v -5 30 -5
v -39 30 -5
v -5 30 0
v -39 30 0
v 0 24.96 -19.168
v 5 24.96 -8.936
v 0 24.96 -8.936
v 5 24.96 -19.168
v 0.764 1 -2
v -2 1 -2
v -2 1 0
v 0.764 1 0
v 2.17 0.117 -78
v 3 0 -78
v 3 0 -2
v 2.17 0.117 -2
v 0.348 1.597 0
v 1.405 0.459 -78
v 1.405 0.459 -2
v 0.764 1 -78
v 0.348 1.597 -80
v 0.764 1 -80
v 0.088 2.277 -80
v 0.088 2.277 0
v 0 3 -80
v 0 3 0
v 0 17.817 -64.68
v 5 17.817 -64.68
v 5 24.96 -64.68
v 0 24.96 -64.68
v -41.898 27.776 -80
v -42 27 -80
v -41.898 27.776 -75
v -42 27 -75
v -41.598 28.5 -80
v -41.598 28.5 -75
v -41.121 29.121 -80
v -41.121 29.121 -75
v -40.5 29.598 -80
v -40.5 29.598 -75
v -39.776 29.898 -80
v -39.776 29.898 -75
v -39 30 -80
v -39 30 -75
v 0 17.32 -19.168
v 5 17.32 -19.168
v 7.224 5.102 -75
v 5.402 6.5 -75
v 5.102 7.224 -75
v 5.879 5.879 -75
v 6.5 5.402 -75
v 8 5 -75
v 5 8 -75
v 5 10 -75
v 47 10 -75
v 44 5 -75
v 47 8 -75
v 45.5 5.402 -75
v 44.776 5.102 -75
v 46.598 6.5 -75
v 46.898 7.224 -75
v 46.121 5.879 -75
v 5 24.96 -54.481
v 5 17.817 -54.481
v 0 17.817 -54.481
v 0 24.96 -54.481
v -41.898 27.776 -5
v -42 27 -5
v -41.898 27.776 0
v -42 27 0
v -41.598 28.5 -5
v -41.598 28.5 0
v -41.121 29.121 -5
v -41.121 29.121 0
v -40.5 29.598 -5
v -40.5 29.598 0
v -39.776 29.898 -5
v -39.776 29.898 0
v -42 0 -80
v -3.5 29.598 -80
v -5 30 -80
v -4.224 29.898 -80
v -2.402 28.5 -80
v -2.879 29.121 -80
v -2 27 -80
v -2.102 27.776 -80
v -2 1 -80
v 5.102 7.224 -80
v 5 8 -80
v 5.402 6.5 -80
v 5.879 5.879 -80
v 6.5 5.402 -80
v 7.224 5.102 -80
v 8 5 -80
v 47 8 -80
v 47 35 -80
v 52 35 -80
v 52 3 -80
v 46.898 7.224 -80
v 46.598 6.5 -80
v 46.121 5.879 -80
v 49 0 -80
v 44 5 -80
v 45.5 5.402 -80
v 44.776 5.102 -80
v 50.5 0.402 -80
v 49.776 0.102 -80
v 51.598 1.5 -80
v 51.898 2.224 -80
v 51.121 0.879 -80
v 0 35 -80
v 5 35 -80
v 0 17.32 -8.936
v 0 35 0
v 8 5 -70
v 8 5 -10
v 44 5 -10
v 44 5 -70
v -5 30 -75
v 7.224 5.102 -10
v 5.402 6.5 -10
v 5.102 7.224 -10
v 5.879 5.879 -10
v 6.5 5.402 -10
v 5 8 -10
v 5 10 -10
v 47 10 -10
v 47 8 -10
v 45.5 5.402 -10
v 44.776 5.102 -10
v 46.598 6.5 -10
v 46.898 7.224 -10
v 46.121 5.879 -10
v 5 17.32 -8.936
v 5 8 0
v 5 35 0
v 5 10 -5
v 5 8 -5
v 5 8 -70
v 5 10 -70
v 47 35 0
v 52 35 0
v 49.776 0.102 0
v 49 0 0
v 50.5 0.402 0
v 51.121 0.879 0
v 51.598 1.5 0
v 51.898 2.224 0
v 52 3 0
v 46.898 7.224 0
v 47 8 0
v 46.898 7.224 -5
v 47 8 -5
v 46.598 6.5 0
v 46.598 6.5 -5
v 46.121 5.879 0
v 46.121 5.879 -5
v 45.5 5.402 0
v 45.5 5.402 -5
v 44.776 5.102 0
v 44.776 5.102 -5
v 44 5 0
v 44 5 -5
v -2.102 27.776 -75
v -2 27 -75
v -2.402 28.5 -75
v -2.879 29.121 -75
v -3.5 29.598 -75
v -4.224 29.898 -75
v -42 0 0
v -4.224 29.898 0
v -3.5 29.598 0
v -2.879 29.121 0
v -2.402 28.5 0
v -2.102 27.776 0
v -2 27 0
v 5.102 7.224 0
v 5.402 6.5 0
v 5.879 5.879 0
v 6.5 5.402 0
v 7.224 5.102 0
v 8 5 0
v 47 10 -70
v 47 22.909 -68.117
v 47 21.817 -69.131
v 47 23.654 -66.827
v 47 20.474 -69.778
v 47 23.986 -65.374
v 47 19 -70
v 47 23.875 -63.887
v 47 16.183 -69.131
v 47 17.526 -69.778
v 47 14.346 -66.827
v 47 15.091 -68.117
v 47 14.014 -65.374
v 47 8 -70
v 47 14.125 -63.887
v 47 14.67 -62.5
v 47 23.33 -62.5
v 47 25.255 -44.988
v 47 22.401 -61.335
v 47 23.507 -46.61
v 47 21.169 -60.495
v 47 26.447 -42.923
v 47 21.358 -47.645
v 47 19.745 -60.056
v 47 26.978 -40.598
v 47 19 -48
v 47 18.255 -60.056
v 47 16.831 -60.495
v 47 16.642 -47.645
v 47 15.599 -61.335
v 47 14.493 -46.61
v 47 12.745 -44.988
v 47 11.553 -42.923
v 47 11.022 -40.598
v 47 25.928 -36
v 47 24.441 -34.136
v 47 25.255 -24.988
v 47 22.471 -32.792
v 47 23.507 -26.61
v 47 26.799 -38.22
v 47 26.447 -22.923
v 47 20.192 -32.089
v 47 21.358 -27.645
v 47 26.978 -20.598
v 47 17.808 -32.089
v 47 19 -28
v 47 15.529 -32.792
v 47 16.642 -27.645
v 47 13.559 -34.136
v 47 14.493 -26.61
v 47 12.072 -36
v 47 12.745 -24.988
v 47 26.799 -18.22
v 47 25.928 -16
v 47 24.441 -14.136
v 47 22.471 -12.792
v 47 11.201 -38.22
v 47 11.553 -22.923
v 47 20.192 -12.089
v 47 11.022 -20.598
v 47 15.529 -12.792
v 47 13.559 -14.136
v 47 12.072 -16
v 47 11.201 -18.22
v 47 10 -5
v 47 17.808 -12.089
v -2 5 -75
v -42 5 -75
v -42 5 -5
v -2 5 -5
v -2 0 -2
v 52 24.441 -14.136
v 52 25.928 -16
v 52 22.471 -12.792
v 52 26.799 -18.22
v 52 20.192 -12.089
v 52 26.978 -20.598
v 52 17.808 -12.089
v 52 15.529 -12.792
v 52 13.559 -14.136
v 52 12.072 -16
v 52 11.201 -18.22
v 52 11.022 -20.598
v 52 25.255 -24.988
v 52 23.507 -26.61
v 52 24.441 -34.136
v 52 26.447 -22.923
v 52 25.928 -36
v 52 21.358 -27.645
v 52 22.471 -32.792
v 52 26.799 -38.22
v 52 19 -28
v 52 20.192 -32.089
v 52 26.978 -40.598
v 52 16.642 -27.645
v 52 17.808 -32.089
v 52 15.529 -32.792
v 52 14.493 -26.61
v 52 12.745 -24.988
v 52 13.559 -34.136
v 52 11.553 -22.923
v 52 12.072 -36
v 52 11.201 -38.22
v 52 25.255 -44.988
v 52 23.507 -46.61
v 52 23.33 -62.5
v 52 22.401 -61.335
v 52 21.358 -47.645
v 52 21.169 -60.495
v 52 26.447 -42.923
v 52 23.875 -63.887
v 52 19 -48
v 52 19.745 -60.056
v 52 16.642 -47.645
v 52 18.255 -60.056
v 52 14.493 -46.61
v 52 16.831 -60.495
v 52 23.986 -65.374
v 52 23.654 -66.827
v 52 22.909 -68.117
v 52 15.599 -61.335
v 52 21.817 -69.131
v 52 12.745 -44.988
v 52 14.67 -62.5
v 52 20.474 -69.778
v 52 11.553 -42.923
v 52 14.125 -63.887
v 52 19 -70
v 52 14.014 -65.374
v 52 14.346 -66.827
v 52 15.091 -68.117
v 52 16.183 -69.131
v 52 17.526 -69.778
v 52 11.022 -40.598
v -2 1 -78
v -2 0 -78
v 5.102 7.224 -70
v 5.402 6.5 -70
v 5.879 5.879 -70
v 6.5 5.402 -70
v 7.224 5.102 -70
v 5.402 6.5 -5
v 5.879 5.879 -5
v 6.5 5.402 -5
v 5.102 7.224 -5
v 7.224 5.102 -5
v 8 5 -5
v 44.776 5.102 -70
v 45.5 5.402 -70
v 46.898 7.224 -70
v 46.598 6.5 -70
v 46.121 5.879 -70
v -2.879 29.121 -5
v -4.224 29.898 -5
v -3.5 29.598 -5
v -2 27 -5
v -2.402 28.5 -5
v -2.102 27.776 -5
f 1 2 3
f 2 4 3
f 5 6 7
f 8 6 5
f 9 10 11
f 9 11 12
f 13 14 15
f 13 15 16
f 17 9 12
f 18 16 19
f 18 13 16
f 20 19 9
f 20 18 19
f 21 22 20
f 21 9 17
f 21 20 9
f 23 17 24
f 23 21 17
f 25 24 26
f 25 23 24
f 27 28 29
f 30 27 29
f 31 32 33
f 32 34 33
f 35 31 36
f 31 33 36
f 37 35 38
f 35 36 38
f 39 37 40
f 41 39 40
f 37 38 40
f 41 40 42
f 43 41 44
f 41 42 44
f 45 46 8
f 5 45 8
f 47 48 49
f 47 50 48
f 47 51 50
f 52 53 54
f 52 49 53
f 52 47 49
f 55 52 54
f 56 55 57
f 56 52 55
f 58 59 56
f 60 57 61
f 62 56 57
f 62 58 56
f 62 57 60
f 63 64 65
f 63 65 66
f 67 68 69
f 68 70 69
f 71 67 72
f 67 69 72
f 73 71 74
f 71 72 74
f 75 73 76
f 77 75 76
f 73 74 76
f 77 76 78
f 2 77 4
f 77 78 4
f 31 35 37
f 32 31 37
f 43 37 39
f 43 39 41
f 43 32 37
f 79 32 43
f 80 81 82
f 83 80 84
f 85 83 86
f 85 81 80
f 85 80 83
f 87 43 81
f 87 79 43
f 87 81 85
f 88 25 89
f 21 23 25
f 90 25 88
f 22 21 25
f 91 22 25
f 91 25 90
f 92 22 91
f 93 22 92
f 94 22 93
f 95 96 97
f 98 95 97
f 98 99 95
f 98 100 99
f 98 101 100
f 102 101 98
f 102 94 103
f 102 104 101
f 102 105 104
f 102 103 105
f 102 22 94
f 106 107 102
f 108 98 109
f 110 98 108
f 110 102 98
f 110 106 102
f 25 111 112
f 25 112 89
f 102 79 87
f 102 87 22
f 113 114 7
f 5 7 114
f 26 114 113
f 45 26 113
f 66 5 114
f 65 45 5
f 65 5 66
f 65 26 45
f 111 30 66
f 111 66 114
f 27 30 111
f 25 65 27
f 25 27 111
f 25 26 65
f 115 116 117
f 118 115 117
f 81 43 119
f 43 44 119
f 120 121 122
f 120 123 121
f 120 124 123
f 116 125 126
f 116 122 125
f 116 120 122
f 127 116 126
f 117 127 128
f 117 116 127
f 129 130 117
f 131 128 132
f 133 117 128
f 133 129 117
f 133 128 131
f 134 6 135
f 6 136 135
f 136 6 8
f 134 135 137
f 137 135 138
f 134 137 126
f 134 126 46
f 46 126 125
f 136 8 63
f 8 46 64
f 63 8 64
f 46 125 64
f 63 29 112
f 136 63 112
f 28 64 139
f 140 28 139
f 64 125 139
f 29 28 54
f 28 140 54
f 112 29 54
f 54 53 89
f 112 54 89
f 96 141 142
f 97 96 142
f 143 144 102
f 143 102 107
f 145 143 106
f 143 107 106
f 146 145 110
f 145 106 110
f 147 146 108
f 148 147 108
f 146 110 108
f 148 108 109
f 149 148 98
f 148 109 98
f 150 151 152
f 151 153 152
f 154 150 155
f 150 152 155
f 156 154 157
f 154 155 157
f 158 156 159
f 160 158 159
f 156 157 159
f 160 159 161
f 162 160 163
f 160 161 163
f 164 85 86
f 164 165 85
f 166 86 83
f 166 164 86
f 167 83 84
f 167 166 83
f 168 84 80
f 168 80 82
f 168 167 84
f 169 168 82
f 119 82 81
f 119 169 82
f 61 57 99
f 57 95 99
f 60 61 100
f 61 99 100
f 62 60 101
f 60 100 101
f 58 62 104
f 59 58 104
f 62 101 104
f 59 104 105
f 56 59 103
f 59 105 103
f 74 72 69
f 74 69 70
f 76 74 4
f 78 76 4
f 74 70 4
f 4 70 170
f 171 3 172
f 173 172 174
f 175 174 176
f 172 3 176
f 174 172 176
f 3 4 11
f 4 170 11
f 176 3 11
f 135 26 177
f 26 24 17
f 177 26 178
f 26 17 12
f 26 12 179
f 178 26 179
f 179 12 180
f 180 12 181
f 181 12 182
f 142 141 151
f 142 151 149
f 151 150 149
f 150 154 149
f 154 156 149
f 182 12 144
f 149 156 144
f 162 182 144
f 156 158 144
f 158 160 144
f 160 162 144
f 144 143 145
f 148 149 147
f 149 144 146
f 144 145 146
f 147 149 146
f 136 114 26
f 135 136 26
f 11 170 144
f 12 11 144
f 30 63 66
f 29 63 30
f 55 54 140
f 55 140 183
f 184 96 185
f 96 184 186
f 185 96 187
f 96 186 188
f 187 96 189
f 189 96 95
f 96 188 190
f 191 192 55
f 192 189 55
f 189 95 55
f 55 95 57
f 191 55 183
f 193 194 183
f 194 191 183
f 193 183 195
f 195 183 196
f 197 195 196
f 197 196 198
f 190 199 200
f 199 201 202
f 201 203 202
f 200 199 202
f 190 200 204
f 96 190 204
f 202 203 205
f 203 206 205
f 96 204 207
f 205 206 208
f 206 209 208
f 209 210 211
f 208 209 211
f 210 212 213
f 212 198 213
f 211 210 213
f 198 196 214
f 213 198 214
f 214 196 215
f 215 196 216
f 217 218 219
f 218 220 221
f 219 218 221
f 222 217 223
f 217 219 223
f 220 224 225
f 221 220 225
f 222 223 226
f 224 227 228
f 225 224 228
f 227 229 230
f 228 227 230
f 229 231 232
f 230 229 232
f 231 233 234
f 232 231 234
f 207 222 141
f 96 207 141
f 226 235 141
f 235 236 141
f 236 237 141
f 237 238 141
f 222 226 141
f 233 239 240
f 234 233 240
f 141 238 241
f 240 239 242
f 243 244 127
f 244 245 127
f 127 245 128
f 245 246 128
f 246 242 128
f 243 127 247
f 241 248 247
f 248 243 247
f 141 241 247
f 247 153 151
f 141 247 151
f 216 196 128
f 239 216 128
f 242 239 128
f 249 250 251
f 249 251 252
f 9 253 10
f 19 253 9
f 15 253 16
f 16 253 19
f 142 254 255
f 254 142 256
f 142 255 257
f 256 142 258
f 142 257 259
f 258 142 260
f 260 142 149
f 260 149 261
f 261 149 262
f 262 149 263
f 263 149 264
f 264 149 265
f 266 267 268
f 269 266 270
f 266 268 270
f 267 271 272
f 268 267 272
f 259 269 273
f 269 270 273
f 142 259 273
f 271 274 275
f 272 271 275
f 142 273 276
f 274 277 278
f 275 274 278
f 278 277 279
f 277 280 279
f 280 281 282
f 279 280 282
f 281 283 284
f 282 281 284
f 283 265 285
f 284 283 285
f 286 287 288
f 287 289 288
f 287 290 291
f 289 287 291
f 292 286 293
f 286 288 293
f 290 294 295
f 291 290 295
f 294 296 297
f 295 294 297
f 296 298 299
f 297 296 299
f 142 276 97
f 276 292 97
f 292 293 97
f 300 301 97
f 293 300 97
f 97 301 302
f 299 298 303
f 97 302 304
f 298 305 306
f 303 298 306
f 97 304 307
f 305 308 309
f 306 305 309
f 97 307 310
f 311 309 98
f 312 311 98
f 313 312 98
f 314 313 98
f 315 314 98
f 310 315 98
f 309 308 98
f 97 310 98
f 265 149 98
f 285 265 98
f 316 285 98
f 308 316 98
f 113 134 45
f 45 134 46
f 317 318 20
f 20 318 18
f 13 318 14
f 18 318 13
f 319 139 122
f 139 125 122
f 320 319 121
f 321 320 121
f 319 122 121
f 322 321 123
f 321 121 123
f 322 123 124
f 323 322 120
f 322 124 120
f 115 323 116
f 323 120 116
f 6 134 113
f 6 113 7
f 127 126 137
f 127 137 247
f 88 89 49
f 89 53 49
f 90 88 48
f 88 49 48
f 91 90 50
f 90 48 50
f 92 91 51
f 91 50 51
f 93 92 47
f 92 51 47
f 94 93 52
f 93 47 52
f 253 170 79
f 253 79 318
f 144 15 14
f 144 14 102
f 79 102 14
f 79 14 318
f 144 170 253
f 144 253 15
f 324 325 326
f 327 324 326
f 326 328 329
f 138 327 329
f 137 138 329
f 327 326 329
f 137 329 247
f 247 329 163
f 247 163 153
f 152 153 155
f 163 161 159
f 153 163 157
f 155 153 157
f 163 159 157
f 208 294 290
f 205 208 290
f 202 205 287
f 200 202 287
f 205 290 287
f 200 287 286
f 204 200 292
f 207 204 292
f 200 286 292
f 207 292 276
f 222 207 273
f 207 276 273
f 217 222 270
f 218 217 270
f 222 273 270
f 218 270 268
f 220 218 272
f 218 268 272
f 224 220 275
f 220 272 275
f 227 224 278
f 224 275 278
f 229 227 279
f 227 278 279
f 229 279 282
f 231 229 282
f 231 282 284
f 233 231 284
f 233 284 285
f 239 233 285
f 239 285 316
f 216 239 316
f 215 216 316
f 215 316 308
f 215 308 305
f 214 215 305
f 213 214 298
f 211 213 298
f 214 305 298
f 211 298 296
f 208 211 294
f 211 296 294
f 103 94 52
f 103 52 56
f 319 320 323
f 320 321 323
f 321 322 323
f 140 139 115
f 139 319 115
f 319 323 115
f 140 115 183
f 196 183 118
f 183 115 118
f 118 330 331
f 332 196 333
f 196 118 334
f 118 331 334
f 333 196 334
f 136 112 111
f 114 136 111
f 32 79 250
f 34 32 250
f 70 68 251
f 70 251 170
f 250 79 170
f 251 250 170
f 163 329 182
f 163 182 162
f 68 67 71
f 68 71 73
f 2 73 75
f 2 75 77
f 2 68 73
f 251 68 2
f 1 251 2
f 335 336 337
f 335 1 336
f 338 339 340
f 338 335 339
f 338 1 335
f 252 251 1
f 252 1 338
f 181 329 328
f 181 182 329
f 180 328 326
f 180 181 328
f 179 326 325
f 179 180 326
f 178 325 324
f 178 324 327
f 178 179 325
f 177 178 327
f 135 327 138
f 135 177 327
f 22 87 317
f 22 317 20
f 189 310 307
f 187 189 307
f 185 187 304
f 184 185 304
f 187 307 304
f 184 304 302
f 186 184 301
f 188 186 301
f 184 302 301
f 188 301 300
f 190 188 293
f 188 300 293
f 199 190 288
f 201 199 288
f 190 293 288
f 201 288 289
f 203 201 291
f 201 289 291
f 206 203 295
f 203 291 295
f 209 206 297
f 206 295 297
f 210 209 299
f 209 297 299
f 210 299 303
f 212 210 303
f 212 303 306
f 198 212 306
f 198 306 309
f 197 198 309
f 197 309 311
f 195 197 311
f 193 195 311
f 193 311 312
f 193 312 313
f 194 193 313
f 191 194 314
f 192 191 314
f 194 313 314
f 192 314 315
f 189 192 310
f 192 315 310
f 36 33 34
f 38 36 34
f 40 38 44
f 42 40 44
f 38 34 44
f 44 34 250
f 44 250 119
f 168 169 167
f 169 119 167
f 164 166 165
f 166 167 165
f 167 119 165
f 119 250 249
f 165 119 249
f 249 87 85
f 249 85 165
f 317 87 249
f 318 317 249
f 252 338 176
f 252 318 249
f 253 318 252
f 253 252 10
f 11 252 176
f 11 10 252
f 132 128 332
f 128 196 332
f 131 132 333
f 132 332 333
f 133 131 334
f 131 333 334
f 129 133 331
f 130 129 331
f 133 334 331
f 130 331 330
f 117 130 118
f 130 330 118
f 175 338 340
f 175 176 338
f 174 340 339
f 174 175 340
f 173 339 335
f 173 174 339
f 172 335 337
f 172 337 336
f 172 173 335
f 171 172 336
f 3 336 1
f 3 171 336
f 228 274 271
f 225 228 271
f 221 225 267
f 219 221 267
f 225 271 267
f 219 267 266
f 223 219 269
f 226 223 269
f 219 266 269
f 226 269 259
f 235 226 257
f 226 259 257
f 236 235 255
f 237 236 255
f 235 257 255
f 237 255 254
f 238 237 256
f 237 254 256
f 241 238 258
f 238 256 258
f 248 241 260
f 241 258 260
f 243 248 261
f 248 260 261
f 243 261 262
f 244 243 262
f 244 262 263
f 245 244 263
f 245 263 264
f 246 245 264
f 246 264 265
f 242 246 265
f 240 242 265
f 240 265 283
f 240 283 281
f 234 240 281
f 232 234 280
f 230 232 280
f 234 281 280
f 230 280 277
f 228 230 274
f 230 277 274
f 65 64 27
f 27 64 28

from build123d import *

# Parameters (mm, degrees)
SKETCH4_W            = 52
SKETCH4_H            = 80
BOSS_EXTRUDE4_DEPTH  = 5
SKETCH6_W            = 5
SKETCH6_H            = 80
BOSS_EXTRUDE5_DEPTH  = 35
SKETCH7_W            = 5
SKETCH7_H            = 80
BOSS_EXTRUDE6_DEPTH  = 35
SKETCH8_W            = 42
SKETCH8_H            = 5
BOSS_EXTRUDE7_DEPTH  = 5
FILLET2_R            = 3
FILLET3_R            = 3
FILLET4_R            = 3
SKETCH9_R            = 8
SKETCH9_R_2          = 5
CUT_EXTRUDE1_DEPTH   = 5
SKETCH10_W           = 5
SKETCH10_H           = 2
BOSS_EXTRUDE8_DEPTH  = 1
SKETCH11_W           = 40
SKETCH11_H           = 80
BOSS_EXTRUDE9_DEPTH  = 5
SKETCH12_W           = 40
SKETCH12_H           = 5
BOSS_EXTRUDE11_DEPTH = 30
FILLET6_R            = 3
SKETCH13_W           = 10.232646845
SKETCH13_H           = 7.639513139
SKETCH13_W_2         = 10.199522787
SKETCH13_H_2         = 7.142143056
CUT_EXTRUDE2_DEPTH   = 30


with BuildPart() as part:
    # Sketch4 → Boss-Extrude4 (new body)
    with BuildSketch(Plane(origin=(0, 0, 0), x_dir=(1, 0, 0), z_dir=(0, 1, 0))):
        with Locations((26, 40)):
            Rectangle(SKETCH4_W, SKETCH4_H)
    extrude(amount=BOSS_EXTRUDE4_DEPTH)

    # Sketch6 → Boss-Extrude5 (add)
    with BuildSketch(Plane.XZ):
        with Locations((49.5, -40)):
            Rectangle(SKETCH6_W, SKETCH6_H)
    extrude(amount=-BOSS_EXTRUDE5_DEPTH)

    # Sketch7 → Boss-Extrude6 (add)
    with BuildSketch(Plane(origin=(0, 0, 0), x_dir=(-1, 0, 0), z_dir=(0, -1, 0))):
        with Locations((-2.5, 40)):
            Rectangle(SKETCH7_W, SKETCH7_H)
    extrude(amount=-BOSS_EXTRUDE6_DEPTH)

    # Sketch8 → Boss-Extrude7 (add)
    with BuildSketch(Plane(origin=(0, 5, 0), x_dir=(1, 0, 0), z_dir=(0, 1, 0))):
        with Locations((26, 72.5)):
            Rectangle(SKETCH8_W, SKETCH8_H)
        with Locations((26, 7.5)):
            Rectangle(SKETCH8_W, SKETCH8_H)
    extrude(amount=BOSS_EXTRUDE7_DEPTH)

    # Fillet2
    fillet2_edges = [part.edges().sort_by_distance(p)[0] for p in [
        (52, 0, -40),
    ]]
    fillet(fillet2_edges, radius=FILLET2_R)

    # Fillet3
    fillet3_edges = [part.edges().sort_by_distance(p)[0] for p in [
        (47, 5, -2.5),
    ]]
    fillet(fillet3_edges, radius=FILLET3_R)

    # Fillet4
    fillet4_edges = [part.edges().sort_by_distance(p)[0] for p in [
        (5, 5, -77.5),
        (5, 5, -40),
        (47, 5, -77.5),
        (0, 0, -40),
        (5, 5, -2.5),
        (47, 5, -40),
    ]]
    fillet(fillet4_edges, radius=FILLET4_R)

    # Sketch9 → Cut-Extrude1 (cut)
    with BuildSketch(Plane(origin=(52, 0, 0), x_dir=(0, 0, -1), z_dir=(1, 0, 0))):
        with Locations((20, 19)):
            Circle(SKETCH9_R)
        with Locations((40, 19)):
            Circle(SKETCH9_R)
        with Locations((65, 19)):
            Circle(SKETCH9_R_2)
    extrude(amount=-CUT_EXTRUDE1_DEPTH, mode=Mode.SUBTRACT)

    # Sketch10 → Boss-Extrude8 (add)
    with BuildSketch(Plane(origin=(0, 0, 0), x_dir=(1, 0, 0), z_dir=(0, 1, 0))):
        with Locations((0.5, 1)):
            Rectangle(SKETCH10_W, SKETCH10_H)
        with Locations((0.5, 79)):
            Rectangle(SKETCH10_W, SKETCH10_H)
    extrude(amount=BOSS_EXTRUDE8_DEPTH)

    # Sketch11 → Boss-Extrude9 (add)
    with BuildSketch(Plane.XZ):
        with Locations((-22, -40)):
            Rectangle(SKETCH11_W, SKETCH11_H)
    extrude(amount=-BOSS_EXTRUDE9_DEPTH)

    # Sketch12 → Boss-Extrude11 (add)
    with BuildSketch(Plane.XZ):
        with Locations((-22, -2.5)):
            Rectangle(SKETCH12_W, SKETCH12_H)
        with Locations((-22, -77.5)):
            Rectangle(SKETCH12_W, SKETCH12_H)
    extrude(amount=-BOSS_EXTRUDE11_DEPTH)

    # Fillet6
    fillet6_edges = [part.edges().sort_by_distance(p)[0] for p in [
        (-42, 30, -2.5),
        (-2, 30, -2.5),
        (-42, 30, -77.5),
        (-2, 30, -77.5),
    ]]
    fillet(fillet6_edges, radius=FILLET6_R)

    # Sketch13 → Cut-Extrude2 (cut)
    with BuildSketch(Plane(origin=(5, 0, 0), x_dir=(0, 0, -1), z_dir=(1, 0, 0))):
        with Locations((14.052030706, 21.139780505)):
            Rectangle(SKETCH13_W, SKETCH13_H)
        with Locations((59.580586702, 21.388465546)):
            Rectangle(SKETCH13_W_2, SKETCH13_H_2)
    extrude(amount=-CUT_EXTRUDE2_DEPTH, mode=Mode.SUBTRACT)


solid = part.part
